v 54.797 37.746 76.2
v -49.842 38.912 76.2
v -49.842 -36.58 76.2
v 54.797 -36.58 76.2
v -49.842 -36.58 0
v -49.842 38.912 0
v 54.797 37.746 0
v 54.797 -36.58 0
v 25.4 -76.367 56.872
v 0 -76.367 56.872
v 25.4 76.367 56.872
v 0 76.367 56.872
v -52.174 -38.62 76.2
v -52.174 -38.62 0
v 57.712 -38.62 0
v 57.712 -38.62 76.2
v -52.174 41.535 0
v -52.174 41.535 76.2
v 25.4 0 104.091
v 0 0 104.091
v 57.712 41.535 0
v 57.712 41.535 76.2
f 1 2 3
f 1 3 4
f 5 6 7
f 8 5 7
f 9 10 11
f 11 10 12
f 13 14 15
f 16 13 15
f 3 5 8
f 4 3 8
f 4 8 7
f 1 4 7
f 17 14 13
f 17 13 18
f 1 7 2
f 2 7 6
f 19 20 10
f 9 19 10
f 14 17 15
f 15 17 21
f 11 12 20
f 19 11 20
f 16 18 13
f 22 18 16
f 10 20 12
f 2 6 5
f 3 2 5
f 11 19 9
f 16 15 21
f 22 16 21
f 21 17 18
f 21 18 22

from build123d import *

# Parameters (mm, degrees)
F2_DEPTH = 76.2
F0_W     = 109.8862290382
F0_H     = 80.1557414234
F4_DEPTH = 25.4


with BuildPart() as f2:
    # F1 (on face) → F2 (new body)
    with BuildSketch(Plane.XY):
        Polygon((54.7973737121, 37.7460680902), (-49.8422943056, 38.9119684696), (-49.8422943056, -36.5801639855), (54.7973737121, -36.5801639855), align=None)
    extrude(amount=F2_DEPTH)


with BuildPart() as f2b:
    # F0 (on Top) → F2, piece 2 (new body)
    with BuildSketch(Plane.XY):
        with Locations((2.7690157294, 1.4573764056)):
            Rectangle(F0_W, F0_H)
    extrude(amount=F2_DEPTH)


with BuildPart() as f4:
    # F3 (on Right) → F4 (new body)
    with BuildSketch(Plane.YZ):
        Polygon((0, 104.0914952755), (-76.366558671, 56.8724796176), (76.366558671, 56.8724796176), align=None)
    extrude(amount=F4_DEPTH)


solid = Compound([f2.part, f2b.part, f4.part])
